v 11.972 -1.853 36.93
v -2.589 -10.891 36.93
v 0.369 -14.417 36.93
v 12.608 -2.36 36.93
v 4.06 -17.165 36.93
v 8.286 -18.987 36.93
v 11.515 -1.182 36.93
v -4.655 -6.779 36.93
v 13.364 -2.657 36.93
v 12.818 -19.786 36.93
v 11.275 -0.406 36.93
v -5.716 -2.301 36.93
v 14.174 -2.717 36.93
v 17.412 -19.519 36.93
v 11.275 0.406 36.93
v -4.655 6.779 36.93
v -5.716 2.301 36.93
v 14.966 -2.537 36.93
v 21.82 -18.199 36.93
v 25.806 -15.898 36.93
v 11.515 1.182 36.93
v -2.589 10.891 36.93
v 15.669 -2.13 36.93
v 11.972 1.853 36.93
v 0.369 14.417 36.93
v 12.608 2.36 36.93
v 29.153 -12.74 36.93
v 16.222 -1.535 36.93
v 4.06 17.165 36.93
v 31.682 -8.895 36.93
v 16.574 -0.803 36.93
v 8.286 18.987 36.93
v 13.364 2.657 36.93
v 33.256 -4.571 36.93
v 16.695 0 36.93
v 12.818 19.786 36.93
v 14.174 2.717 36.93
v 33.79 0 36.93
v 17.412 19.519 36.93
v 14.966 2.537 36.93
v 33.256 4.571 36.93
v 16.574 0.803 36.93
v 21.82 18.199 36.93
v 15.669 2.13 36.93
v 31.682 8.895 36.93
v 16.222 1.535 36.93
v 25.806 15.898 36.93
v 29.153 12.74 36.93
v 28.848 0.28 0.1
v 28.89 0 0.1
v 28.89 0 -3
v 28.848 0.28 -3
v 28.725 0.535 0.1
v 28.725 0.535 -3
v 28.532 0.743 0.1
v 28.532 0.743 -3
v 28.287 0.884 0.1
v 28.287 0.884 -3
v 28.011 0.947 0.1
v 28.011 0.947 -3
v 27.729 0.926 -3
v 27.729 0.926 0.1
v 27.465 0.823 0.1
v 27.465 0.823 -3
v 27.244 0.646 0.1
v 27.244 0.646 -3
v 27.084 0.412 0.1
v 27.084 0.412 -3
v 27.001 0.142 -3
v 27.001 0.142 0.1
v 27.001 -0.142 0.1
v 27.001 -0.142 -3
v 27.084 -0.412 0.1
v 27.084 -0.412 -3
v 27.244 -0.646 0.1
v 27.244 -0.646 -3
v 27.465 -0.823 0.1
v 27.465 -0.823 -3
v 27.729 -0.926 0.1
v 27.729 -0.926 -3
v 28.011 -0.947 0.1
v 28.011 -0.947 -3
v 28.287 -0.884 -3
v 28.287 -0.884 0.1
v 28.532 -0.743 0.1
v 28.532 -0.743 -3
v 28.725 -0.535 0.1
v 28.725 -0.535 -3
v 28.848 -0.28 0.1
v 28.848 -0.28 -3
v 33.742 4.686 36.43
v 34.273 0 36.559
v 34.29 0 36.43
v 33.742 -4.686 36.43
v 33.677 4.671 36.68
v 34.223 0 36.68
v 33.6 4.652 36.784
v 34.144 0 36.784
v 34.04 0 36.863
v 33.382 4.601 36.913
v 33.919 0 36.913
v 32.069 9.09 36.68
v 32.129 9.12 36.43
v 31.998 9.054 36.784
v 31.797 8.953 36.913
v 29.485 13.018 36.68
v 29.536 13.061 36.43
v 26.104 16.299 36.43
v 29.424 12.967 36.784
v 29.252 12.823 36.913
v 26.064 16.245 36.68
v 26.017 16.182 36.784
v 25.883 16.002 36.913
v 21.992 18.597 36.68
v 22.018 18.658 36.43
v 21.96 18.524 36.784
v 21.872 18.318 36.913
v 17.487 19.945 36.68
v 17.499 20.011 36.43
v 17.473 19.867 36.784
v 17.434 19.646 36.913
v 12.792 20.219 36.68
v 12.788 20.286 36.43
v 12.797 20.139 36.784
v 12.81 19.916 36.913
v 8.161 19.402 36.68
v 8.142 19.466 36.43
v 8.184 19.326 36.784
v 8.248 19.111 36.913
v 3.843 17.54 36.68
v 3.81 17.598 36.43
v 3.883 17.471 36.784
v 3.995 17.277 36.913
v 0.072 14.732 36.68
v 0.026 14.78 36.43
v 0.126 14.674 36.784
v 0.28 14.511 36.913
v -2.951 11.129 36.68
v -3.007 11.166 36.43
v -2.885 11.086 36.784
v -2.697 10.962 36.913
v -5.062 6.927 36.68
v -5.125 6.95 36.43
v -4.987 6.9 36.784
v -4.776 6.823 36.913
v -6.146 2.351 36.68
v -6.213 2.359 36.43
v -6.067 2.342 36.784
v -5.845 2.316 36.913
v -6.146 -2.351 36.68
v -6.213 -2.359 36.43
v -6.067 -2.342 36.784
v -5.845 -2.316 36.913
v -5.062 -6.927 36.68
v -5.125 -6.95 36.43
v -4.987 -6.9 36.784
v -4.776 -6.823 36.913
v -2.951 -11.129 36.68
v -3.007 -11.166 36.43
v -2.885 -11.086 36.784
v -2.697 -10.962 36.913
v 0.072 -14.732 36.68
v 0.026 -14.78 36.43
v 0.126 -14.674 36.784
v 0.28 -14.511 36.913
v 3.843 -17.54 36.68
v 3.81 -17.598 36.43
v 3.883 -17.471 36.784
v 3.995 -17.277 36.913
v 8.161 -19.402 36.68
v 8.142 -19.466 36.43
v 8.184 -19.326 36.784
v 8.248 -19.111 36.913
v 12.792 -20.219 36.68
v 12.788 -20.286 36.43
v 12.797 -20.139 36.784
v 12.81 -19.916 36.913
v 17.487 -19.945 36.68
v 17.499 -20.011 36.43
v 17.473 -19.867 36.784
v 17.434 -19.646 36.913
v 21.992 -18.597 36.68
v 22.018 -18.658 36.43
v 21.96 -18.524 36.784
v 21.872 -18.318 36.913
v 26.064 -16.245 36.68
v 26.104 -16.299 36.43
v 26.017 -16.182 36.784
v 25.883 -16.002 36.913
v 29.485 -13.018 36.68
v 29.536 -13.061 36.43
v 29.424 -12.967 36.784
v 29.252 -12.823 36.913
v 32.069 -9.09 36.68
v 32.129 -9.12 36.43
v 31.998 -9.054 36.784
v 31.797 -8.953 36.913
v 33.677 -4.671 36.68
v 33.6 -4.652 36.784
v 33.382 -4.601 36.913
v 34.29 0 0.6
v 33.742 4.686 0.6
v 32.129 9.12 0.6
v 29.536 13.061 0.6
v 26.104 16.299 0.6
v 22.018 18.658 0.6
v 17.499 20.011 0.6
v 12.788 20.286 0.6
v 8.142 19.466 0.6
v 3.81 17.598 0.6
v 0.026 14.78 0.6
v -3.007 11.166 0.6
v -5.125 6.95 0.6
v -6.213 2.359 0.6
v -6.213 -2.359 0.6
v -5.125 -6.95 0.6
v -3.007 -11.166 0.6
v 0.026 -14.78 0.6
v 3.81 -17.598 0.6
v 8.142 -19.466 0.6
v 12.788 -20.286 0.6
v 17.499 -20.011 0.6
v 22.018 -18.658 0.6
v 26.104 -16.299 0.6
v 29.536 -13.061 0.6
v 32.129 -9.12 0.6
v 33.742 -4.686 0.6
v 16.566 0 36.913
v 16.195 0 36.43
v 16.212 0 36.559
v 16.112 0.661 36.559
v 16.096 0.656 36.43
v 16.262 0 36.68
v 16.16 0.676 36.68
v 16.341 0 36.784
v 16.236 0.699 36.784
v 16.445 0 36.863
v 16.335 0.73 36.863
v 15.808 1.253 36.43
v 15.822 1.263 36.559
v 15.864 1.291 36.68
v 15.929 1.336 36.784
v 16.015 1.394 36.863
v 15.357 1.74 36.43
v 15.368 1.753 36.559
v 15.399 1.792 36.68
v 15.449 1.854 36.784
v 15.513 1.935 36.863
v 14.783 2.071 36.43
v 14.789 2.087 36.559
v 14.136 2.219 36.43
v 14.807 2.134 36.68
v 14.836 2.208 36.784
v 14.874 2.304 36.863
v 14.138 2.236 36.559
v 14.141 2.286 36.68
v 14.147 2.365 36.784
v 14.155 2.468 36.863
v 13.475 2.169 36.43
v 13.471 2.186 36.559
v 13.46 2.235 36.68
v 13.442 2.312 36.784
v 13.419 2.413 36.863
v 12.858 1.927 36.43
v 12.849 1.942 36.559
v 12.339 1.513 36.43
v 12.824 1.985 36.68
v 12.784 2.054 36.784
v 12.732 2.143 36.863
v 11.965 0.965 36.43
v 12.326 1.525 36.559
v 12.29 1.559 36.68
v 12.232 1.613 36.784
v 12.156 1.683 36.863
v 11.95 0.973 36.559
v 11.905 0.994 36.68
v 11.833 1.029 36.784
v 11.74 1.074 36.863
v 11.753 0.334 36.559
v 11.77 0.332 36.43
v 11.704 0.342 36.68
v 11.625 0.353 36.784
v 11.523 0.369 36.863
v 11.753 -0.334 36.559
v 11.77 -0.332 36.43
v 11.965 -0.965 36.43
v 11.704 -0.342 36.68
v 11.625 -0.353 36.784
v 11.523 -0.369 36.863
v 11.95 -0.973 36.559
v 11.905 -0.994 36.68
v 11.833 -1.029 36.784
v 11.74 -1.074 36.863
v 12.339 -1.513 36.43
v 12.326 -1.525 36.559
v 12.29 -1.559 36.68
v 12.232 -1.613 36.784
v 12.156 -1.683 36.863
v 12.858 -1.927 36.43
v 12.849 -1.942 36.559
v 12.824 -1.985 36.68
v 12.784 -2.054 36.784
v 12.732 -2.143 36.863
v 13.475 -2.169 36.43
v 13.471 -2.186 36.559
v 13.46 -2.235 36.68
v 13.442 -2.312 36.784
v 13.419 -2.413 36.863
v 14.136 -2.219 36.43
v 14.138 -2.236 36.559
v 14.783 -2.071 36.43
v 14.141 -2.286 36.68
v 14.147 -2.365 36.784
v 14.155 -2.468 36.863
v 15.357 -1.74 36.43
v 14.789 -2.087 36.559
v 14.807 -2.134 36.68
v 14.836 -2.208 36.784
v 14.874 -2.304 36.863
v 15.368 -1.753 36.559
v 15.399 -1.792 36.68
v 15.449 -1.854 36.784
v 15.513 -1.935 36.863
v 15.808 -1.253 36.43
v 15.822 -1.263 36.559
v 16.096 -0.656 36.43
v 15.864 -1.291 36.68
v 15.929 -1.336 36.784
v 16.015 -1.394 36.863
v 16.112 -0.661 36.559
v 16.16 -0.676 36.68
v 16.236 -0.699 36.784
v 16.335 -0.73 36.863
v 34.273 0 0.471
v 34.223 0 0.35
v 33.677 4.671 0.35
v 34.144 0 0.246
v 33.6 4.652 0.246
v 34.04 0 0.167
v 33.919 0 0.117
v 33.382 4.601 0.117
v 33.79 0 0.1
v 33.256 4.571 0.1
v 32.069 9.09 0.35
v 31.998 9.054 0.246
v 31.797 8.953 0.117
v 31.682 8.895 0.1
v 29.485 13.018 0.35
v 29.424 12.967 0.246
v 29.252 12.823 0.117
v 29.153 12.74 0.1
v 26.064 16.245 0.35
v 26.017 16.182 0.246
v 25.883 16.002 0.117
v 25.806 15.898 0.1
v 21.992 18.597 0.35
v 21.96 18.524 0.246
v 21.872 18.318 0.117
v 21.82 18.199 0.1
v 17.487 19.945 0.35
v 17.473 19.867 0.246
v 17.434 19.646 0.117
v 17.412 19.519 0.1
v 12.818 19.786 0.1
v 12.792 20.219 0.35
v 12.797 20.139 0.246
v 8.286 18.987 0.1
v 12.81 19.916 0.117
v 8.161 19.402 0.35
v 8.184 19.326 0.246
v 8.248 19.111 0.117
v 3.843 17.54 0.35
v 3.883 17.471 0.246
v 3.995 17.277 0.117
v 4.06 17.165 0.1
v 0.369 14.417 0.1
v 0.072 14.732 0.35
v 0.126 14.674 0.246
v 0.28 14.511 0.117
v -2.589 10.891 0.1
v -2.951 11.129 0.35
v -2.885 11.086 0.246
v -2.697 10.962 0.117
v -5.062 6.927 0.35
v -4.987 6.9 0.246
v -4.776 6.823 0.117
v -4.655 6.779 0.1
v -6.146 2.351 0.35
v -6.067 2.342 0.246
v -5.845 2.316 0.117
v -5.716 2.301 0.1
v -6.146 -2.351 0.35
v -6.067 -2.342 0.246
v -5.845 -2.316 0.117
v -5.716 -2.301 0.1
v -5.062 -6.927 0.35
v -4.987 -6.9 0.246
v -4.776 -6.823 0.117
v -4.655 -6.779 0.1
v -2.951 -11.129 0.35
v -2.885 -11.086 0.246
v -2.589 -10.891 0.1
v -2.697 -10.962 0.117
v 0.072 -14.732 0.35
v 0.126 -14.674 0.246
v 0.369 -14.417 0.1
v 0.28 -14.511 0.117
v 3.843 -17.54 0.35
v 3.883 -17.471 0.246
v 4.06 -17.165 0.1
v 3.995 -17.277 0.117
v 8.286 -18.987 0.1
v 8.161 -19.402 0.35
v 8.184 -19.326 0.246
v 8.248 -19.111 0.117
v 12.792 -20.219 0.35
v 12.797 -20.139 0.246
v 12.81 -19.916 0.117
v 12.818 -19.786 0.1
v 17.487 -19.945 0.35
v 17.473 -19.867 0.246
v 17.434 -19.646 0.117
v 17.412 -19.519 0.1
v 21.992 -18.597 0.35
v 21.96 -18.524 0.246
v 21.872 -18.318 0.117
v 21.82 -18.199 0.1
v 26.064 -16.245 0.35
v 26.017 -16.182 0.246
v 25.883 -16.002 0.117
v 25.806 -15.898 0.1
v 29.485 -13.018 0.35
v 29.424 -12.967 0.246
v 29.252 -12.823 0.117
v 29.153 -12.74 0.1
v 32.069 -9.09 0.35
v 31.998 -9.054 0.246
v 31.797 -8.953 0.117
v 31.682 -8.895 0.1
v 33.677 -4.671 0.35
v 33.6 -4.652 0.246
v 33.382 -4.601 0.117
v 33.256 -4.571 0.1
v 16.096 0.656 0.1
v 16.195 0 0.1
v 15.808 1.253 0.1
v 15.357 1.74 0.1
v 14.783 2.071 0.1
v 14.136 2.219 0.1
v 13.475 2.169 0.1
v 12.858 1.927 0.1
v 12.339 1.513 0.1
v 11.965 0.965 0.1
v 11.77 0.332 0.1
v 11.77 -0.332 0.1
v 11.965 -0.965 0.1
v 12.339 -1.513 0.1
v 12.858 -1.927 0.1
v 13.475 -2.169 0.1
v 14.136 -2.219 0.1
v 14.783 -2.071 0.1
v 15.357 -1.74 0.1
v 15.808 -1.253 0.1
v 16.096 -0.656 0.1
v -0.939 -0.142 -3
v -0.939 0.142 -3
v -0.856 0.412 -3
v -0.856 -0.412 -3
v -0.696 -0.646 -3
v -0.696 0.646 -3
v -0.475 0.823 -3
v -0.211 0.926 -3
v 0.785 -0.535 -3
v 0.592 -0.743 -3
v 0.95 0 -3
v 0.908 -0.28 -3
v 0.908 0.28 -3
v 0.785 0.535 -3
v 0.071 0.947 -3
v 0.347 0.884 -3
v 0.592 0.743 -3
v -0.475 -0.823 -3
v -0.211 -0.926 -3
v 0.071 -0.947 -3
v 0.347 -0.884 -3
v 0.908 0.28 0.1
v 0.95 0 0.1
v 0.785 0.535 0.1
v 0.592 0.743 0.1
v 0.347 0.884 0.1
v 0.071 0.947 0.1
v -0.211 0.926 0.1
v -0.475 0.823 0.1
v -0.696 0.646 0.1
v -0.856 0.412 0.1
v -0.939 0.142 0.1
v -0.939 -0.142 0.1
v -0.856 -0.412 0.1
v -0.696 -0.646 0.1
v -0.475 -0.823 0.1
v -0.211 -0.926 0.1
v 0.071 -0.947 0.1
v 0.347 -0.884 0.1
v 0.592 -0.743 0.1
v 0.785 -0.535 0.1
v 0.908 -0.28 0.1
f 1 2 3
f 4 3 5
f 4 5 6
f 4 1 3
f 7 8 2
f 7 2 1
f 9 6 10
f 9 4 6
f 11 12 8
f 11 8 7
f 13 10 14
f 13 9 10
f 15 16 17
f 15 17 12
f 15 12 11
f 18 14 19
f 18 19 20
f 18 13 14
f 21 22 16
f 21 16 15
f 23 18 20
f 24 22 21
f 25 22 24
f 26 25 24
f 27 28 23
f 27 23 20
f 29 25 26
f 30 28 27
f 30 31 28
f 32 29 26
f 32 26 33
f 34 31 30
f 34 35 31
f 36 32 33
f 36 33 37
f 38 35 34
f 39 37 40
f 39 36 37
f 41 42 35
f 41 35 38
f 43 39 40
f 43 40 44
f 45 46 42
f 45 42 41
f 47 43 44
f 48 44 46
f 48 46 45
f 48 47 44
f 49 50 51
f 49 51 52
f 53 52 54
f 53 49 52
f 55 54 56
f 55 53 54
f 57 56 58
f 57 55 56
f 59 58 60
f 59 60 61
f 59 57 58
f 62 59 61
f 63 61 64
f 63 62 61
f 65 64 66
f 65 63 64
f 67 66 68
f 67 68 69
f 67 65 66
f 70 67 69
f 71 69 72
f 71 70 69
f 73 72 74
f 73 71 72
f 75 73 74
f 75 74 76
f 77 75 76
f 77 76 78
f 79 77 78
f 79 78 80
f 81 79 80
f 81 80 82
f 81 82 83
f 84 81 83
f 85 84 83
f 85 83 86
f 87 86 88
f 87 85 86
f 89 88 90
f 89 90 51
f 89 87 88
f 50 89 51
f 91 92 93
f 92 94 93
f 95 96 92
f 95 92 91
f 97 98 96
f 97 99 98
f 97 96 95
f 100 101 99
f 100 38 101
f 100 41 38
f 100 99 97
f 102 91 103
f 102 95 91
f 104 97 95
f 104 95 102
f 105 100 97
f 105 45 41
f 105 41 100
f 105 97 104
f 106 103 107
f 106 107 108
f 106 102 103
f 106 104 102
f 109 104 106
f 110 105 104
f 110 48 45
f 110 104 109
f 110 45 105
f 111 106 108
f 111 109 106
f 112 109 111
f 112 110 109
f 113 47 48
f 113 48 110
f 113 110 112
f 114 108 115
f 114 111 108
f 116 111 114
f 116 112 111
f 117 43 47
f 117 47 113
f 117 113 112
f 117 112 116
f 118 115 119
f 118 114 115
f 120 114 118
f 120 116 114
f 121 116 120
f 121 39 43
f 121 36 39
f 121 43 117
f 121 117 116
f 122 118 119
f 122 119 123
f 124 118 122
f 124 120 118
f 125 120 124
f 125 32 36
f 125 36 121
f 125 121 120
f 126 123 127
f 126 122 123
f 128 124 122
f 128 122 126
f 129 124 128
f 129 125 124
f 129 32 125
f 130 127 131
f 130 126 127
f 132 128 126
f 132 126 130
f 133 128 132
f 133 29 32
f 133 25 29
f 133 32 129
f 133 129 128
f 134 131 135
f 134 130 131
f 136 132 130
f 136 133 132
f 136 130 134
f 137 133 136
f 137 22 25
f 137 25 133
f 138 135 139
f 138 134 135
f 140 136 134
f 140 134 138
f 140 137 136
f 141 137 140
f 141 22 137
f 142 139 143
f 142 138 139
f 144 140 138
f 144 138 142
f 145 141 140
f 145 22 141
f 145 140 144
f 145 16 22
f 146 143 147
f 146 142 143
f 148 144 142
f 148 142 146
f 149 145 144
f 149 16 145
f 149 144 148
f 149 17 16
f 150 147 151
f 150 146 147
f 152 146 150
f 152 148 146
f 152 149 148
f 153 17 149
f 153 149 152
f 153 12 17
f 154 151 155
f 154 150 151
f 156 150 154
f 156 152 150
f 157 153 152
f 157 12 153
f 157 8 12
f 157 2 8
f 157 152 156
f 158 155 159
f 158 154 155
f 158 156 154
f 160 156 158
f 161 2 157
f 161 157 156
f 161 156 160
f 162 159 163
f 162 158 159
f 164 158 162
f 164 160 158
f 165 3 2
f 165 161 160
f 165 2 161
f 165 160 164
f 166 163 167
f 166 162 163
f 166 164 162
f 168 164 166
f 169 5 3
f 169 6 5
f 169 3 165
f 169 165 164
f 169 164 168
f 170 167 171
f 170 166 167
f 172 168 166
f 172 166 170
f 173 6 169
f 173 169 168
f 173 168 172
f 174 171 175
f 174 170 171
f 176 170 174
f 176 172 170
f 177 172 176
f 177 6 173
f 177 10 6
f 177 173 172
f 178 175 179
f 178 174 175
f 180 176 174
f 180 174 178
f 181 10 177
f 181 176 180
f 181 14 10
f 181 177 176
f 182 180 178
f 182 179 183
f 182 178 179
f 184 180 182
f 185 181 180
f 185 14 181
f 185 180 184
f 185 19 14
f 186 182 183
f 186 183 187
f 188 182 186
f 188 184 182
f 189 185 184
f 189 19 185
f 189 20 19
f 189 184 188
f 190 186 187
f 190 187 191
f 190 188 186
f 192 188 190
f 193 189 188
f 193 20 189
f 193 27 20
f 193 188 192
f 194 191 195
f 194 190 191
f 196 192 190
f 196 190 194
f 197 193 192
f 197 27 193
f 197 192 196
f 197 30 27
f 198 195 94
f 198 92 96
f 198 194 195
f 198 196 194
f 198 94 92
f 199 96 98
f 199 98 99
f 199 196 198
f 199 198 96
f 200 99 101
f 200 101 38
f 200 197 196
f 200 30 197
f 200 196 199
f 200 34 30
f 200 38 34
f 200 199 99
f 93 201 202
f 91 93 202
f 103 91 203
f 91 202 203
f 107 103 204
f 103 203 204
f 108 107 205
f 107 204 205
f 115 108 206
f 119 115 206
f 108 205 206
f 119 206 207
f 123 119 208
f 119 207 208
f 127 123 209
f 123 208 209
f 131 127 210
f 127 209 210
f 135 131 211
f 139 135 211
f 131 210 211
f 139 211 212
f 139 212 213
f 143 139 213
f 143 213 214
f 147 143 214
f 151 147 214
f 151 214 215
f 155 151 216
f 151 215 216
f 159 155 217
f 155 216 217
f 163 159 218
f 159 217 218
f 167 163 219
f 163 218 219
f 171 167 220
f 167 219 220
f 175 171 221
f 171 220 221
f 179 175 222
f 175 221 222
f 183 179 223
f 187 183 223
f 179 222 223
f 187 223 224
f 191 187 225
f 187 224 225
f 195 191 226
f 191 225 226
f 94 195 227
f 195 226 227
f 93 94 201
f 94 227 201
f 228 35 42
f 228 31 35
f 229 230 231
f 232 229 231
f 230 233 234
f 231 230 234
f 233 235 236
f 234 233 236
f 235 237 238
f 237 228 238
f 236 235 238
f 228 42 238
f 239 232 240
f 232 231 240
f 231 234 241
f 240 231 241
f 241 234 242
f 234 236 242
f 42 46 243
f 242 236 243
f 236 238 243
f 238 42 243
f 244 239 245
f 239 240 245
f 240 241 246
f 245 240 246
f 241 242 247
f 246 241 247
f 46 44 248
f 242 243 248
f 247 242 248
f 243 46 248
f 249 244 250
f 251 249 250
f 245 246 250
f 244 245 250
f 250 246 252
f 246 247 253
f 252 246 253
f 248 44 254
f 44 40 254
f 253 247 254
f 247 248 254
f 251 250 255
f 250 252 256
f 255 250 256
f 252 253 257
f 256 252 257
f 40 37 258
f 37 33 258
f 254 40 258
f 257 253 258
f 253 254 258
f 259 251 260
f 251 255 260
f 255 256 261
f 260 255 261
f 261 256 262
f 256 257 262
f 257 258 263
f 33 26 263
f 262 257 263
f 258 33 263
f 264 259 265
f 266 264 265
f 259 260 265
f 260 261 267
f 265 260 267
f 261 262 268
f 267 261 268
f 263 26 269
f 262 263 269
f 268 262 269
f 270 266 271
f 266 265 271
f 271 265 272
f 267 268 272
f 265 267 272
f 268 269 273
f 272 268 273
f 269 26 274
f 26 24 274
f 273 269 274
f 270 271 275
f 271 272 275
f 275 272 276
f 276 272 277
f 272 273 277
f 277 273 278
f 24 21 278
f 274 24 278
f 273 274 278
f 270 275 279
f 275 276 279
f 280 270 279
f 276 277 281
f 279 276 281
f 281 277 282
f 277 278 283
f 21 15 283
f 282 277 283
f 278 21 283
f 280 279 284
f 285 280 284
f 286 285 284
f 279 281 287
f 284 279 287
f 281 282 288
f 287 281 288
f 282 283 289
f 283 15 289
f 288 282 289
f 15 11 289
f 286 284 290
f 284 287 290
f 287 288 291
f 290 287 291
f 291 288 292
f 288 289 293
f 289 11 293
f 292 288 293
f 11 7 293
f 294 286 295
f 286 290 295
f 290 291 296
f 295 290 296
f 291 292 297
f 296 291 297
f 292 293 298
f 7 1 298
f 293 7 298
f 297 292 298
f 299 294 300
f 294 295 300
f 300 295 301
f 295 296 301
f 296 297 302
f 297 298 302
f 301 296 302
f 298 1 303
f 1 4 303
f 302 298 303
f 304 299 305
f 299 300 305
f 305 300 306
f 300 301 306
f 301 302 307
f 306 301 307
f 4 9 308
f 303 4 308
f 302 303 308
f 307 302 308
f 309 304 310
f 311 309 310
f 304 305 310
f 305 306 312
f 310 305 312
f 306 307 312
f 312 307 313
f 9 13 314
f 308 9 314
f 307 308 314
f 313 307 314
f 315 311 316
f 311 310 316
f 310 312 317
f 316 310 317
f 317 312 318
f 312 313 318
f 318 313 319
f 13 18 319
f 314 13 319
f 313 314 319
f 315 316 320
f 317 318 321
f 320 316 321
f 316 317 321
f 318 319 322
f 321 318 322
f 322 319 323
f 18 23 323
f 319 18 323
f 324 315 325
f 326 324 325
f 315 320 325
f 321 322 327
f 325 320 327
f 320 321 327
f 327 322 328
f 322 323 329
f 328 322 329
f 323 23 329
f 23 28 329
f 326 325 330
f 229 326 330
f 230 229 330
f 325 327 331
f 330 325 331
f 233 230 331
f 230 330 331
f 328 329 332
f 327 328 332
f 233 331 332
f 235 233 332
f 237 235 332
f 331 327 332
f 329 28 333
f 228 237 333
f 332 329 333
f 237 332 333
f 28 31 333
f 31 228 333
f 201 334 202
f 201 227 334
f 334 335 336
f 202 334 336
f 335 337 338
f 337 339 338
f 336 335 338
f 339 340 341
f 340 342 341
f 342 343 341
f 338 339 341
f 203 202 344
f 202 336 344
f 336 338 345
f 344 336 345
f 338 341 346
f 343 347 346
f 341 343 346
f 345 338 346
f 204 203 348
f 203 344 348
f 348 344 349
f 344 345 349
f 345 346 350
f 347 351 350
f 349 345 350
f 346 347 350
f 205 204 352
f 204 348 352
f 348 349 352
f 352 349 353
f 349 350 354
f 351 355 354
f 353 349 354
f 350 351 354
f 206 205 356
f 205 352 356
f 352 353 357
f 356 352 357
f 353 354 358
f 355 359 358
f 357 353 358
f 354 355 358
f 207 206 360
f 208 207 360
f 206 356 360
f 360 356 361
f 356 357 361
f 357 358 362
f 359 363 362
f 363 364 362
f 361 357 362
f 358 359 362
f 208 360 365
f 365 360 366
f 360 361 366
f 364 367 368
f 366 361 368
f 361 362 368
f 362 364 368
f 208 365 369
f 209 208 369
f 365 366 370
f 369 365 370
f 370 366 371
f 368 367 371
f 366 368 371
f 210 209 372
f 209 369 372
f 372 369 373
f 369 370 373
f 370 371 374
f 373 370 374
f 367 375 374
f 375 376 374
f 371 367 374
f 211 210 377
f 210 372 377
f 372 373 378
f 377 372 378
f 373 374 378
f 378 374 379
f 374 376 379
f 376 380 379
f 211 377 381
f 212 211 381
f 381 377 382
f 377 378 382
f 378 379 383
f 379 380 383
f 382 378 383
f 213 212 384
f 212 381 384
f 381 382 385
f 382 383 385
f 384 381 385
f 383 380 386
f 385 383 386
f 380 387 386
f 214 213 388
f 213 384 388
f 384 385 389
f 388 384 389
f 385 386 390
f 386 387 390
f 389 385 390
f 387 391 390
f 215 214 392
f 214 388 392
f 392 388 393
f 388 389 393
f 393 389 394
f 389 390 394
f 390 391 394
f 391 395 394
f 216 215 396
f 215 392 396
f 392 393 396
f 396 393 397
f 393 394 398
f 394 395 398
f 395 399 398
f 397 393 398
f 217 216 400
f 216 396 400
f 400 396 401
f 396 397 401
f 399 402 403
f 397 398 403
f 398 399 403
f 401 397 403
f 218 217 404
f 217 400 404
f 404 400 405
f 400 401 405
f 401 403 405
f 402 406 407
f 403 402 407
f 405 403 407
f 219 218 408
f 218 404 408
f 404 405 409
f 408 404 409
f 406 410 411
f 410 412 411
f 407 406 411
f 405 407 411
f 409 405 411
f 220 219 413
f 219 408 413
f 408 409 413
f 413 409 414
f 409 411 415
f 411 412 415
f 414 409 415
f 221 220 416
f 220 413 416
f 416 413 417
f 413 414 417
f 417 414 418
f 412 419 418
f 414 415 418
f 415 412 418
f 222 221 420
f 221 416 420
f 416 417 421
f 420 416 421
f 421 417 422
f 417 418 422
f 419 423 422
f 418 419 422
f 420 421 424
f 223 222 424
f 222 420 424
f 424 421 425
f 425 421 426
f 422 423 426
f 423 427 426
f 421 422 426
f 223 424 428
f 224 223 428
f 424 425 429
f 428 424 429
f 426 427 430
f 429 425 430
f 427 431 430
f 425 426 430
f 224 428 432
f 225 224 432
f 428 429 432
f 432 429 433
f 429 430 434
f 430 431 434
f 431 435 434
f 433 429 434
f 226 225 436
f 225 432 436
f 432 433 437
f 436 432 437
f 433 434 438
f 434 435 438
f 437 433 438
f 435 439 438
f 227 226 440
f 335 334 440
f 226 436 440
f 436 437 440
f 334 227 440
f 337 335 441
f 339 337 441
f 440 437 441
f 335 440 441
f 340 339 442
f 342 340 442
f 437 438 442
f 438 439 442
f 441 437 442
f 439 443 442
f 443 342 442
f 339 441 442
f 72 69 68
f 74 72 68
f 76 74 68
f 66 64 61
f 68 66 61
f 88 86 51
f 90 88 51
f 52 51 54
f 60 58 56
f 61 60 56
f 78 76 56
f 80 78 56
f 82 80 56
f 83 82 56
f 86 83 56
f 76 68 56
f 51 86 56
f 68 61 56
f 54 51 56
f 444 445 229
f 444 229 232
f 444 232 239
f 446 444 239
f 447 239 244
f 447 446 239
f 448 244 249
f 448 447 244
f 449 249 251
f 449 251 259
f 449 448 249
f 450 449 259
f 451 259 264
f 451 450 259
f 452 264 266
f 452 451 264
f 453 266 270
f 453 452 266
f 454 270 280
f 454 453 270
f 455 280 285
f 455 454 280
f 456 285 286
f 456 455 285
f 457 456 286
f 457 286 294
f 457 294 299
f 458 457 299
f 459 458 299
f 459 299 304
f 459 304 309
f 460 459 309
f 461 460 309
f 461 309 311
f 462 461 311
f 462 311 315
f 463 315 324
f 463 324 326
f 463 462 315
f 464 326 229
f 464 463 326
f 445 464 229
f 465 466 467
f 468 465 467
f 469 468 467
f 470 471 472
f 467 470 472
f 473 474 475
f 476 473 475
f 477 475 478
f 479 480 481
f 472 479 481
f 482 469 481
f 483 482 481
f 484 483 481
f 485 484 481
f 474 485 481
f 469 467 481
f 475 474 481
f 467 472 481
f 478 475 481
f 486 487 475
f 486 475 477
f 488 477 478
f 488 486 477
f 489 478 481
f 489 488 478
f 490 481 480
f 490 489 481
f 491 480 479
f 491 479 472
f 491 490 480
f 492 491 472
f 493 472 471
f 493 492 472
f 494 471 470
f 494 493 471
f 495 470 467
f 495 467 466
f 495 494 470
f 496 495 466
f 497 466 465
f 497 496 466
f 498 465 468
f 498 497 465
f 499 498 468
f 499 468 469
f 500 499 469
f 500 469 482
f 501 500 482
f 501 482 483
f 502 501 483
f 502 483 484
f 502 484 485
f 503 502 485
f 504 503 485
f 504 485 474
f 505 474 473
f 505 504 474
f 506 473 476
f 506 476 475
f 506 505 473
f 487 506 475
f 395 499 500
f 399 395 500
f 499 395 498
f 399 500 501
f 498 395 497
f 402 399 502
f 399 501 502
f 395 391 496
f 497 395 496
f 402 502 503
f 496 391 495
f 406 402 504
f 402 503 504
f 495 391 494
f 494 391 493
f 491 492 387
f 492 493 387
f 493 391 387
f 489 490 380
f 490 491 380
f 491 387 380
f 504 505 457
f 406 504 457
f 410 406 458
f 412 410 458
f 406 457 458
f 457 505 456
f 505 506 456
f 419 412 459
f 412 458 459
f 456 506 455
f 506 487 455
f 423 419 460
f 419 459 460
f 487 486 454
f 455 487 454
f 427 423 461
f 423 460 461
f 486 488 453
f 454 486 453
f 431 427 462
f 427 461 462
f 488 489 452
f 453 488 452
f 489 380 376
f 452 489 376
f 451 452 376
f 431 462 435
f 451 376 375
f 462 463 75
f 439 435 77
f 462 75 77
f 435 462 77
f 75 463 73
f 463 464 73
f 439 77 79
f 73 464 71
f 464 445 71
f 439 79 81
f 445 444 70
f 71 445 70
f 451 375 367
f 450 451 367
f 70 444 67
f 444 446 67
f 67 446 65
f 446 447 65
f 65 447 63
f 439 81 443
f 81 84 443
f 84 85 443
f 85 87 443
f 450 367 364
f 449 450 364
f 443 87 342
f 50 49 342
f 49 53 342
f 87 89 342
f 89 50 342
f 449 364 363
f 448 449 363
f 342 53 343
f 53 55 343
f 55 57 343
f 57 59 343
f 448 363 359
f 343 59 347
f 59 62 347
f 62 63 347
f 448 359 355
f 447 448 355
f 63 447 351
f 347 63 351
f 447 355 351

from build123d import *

# Parameters (mm, degrees)
SKETCH001_R       = 0.95
PAD001_DEPTH      = 18.415
PAD001_DEPTH_BACK = 3.5
SKETCH_R          = 20.32
SKETCH_R_2        = 2.225
PAD_DEPTH         = 36.83
FILLET_R          = 0.5


with BuildPart() as pad001:
    # Sketch001 → Pad001 (new body, two sides)
    with BuildSketch(Plane.XY.offset(0.5)) as pad001_sk:
        Circle(SKETCH001_R)
        with Locations((27.94, 0)):
            Circle(SKETCH001_R)
    extrude(amount=PAD001_DEPTH)
    extrude(pad001_sk.sketch, amount=-PAD001_DEPTH_BACK)


with BuildPart() as fillet_mp_cp:
    # Sketch → Pad (new body)
    with BuildSketch(Plane.XY.offset(0.1)):
        with Locations((13.97, 0)):
            Circle(SKETCH_R)
        with Locations((13.97, 0)):
            Circle(SKETCH_R_2, mode=Mode.SUBTRACT)
    extrude(amount=PAD_DEPTH)

    # Fillet
    fillet_edges = [fillet_mp_cp.edges().sort_by_distance(p)[0] for p in [
        (11.745, 0, 36.93),
        (-6.35, 0, 36.93),
        (-6.35, 0, 0.1),
    ]]
    fillet(fillet_edges, radius=FILLET_R)

    # Fillet_mp_cp: union Pad001
    add(pad001.part)


solid = fillet_mp_cp.part
